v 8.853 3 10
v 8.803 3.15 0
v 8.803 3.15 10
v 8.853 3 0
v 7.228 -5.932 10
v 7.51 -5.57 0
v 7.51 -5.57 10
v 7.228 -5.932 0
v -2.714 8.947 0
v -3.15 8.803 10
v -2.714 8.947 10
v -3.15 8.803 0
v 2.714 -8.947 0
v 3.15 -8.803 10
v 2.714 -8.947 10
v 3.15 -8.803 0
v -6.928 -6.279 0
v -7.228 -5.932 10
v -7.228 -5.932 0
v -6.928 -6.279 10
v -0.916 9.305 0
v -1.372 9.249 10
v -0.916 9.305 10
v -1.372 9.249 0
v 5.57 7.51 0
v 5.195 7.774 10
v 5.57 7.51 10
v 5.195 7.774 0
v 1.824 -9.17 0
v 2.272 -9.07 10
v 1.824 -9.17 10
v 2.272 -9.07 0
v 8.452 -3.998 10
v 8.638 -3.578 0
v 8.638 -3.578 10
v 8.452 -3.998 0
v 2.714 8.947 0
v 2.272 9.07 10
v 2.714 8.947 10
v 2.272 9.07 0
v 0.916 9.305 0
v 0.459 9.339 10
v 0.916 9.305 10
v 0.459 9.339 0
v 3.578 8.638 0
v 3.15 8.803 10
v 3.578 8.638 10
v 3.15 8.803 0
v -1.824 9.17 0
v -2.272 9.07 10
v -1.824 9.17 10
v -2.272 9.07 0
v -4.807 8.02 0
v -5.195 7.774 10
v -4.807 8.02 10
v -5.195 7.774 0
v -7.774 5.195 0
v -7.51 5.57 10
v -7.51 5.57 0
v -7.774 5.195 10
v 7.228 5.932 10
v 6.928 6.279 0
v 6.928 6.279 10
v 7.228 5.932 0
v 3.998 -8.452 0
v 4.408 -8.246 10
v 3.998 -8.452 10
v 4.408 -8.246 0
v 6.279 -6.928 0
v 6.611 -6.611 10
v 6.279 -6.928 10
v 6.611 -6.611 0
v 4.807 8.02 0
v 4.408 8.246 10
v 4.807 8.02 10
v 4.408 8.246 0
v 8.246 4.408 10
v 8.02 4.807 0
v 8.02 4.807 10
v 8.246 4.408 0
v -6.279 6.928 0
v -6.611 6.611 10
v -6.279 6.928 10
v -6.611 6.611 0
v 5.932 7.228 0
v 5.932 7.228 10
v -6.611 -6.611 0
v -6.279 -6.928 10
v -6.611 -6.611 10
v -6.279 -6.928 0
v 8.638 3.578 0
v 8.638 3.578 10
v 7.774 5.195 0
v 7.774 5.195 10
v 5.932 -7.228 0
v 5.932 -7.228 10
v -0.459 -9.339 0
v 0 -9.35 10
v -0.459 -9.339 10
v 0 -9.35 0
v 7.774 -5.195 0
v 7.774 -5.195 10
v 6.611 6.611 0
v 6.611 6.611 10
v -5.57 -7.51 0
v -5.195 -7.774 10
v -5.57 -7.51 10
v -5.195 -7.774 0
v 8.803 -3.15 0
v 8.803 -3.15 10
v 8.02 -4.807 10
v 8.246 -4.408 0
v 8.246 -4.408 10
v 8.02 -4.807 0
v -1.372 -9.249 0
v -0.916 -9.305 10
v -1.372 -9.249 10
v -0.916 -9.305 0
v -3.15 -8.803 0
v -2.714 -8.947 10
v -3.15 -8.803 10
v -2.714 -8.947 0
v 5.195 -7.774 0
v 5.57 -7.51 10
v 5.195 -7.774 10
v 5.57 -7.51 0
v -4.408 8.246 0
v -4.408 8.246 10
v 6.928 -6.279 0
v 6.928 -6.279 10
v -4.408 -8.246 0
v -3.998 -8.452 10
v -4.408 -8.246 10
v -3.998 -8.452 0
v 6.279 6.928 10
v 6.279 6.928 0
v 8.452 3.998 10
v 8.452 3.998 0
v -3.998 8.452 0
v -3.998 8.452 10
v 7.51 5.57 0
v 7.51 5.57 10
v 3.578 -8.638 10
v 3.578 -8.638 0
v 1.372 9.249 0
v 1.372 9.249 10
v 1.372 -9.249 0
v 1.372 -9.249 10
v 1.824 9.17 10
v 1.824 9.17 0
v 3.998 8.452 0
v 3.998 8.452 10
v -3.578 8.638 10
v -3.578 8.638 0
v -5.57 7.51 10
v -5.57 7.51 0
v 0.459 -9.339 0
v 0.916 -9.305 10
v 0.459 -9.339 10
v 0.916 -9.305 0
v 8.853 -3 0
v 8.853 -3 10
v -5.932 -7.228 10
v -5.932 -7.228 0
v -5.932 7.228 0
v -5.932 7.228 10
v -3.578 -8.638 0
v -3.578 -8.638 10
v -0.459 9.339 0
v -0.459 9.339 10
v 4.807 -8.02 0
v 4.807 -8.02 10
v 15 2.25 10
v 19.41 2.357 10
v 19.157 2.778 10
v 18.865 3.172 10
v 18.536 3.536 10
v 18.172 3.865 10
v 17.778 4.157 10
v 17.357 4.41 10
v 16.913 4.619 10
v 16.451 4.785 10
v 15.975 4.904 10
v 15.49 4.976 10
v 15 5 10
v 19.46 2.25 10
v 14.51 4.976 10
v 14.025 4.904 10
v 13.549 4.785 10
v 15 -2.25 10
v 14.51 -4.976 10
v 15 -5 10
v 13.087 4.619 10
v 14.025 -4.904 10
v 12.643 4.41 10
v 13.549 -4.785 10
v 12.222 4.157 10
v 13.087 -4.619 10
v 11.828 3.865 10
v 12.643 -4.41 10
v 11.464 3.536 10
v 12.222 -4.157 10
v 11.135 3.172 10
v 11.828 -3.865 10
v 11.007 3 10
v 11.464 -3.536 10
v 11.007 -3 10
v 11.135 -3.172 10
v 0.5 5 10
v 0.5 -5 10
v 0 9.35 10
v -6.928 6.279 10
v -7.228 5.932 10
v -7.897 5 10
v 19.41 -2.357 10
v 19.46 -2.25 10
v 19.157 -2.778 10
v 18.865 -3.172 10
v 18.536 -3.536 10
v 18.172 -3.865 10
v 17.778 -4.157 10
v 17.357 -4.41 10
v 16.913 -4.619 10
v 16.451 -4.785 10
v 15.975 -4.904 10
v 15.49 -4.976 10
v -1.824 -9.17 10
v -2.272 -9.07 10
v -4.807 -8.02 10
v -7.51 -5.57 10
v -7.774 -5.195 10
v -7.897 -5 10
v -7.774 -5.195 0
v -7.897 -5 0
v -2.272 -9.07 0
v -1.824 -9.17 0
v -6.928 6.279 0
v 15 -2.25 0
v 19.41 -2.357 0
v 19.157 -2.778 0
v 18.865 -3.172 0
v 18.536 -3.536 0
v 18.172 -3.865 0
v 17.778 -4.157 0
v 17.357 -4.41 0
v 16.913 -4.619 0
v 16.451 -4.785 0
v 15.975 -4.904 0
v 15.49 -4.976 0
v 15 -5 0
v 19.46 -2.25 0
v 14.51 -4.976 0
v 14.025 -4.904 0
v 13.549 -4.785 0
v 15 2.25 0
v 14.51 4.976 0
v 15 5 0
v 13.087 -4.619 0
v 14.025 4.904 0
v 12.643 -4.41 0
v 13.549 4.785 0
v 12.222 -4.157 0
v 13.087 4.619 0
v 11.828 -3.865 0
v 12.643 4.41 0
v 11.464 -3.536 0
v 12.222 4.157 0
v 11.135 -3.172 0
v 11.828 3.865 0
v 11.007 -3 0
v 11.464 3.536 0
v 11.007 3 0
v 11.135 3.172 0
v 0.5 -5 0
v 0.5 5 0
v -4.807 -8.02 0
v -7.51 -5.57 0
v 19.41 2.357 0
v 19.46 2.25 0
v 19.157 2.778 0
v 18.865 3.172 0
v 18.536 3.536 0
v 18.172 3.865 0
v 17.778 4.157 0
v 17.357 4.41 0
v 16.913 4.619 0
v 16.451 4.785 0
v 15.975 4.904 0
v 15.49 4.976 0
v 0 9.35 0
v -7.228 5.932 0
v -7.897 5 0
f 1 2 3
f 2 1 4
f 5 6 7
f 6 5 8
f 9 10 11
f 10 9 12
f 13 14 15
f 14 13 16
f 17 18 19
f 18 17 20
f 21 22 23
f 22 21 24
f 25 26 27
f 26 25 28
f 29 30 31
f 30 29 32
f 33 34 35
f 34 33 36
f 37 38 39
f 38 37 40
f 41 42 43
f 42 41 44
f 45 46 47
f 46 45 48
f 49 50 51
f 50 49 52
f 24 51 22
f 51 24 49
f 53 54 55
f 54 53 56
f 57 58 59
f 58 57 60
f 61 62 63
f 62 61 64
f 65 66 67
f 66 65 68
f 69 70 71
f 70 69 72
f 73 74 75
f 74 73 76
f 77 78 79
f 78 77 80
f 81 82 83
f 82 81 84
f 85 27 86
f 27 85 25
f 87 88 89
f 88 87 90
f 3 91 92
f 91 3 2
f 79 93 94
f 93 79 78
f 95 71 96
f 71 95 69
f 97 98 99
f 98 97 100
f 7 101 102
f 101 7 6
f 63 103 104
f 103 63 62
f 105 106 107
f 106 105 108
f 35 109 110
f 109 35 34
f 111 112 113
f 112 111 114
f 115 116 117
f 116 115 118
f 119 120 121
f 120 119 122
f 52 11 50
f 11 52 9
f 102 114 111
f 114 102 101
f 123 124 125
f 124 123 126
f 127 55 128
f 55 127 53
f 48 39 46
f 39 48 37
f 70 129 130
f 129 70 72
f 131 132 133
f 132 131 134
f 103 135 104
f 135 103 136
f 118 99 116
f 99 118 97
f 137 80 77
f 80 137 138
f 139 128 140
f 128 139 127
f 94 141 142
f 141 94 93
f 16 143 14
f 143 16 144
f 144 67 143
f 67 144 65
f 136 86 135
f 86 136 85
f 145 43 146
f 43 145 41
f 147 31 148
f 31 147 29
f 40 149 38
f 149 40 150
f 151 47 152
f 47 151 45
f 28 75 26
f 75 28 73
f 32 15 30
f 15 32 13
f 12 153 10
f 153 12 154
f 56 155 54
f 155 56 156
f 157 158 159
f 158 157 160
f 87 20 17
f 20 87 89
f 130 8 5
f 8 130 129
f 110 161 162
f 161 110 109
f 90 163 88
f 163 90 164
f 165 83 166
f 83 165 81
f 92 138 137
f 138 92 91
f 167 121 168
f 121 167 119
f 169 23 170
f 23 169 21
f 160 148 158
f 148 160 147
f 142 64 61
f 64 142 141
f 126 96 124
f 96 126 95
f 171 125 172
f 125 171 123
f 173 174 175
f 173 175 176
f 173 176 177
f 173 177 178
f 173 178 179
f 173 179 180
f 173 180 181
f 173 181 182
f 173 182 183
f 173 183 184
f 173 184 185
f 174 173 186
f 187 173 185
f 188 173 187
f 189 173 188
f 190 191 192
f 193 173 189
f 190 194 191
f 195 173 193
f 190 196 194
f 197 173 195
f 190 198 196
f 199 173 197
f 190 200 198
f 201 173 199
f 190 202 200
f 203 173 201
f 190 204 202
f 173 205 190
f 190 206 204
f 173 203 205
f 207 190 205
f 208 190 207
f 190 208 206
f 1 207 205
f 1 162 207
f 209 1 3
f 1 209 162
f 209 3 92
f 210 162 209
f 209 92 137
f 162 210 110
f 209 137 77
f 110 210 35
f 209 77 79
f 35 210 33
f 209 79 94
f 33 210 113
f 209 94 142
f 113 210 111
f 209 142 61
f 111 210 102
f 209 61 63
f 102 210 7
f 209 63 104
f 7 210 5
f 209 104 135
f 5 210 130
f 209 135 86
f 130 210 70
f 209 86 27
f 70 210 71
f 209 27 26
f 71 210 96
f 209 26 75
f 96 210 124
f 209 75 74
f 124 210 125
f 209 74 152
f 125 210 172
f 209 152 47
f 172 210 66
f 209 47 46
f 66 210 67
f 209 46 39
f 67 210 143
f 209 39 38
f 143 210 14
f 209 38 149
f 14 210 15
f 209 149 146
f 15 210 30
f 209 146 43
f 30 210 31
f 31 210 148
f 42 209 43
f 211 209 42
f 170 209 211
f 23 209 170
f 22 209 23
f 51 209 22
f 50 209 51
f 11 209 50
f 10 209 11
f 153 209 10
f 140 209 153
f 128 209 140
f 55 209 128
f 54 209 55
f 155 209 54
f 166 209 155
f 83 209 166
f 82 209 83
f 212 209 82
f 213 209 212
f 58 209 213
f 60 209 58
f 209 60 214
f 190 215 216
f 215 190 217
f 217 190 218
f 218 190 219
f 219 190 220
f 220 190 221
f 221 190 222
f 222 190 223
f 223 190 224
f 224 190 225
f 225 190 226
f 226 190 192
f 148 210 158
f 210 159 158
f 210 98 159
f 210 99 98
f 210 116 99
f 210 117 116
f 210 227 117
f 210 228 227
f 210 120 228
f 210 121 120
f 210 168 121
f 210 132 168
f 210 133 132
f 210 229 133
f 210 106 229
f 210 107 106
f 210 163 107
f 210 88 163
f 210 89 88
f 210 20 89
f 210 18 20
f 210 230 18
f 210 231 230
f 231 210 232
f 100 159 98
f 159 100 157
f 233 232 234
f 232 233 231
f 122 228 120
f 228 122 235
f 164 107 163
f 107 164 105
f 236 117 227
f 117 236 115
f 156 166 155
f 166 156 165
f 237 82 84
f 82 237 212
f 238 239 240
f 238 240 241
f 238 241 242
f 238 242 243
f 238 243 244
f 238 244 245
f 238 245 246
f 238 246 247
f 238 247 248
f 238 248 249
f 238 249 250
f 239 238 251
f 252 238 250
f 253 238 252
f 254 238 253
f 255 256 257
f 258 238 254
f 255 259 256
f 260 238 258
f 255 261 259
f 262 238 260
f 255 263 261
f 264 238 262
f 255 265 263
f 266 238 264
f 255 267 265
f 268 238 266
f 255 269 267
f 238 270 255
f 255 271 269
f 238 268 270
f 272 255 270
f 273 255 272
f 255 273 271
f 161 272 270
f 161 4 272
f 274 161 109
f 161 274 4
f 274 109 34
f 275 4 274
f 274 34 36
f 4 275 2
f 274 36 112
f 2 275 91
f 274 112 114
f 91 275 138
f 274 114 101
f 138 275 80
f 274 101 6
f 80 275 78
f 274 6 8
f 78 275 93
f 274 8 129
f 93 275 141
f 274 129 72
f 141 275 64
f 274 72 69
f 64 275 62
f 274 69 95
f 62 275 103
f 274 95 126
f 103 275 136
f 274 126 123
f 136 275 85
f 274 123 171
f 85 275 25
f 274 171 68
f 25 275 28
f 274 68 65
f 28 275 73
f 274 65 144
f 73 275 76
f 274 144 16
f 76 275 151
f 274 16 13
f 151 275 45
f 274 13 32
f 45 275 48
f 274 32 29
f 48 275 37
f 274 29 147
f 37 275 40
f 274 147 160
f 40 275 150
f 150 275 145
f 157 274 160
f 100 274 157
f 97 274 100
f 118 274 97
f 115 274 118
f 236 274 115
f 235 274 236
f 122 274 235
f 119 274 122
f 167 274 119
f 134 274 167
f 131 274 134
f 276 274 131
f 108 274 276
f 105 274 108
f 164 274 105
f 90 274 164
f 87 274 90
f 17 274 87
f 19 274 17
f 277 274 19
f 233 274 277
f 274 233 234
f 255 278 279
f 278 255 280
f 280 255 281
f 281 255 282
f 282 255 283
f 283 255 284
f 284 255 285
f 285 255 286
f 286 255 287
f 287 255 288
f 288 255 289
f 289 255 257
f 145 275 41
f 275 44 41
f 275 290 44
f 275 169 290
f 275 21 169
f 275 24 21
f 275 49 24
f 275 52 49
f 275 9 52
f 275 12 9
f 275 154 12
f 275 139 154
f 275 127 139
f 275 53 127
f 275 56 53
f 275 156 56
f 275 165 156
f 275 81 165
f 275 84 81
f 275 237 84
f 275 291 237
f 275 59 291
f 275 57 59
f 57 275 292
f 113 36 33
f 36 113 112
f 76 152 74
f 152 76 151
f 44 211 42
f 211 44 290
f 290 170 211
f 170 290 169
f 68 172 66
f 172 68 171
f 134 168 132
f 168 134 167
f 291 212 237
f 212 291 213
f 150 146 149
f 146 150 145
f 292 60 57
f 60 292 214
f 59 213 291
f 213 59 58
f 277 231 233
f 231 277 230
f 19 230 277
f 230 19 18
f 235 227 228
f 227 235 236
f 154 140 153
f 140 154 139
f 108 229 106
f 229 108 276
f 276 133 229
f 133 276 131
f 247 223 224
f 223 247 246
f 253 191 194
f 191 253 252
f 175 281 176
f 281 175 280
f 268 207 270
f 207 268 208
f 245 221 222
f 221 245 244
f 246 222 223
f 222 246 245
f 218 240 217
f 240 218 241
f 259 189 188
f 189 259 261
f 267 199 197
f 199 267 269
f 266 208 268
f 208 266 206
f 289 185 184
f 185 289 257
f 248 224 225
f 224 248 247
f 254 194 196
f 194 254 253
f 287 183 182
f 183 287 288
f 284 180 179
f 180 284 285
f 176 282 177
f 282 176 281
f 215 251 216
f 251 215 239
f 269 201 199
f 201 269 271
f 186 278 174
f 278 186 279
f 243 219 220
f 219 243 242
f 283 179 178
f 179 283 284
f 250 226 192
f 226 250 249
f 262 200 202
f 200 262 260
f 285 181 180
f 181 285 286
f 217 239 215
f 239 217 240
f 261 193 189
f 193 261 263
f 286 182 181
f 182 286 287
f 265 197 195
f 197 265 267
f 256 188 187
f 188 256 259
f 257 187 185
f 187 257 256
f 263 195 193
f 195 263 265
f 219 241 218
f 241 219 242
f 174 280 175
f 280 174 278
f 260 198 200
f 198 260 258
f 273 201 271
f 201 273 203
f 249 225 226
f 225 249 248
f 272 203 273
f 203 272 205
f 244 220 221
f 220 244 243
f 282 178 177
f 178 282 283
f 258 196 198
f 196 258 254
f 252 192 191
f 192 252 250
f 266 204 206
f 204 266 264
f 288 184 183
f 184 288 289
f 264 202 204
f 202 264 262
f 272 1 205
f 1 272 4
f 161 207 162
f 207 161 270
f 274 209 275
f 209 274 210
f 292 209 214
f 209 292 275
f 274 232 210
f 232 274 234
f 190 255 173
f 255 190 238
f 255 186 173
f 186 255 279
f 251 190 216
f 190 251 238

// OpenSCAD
// Tubing clip for 12.7 mm lab stand rod
// Print orientation: flat on bed, extruded up +Z

$fn = 96;

// ---- Ring 1: rod ring ----
ring1_id   = 12.7;   // inner diameter (rod clearance)
ring1_wall = 3;      // wall thickness
ring1_od   = ring1_id + 2 * ring1_wall; // outer diameter = 18.7
ring1_x    = 0;      // centre X
ring1_y    = 0;      // centre Y

// ---- Ring 2: tubing ring ----
ring2_id   = 6;      // inner diameter
ring2_wall = 2;      // wall thickness
ring2_od   = ring2_id + 2 * ring2_wall; // outer diameter = 10
ring2_x    = 15;     // centre X
ring2_y    = 0;      // centre Y

// ---- Bridge ----
bridge_x0  = 8;      // start X
bridge_x1  = 12;     // end X
bridge_w   = 6;      // width in Y

// ---- Cutouts ----
cut1_w     = 10;     // rod ring opening width (-X side)
cut2_w     = 4.5;    // tubing ring opening width (+X side)
eps        = 0.5;    // cutter overshoot

// ---- Model ----
h = 10;              // extrusion height
difference() {
    union() {
        // Rod ring
        cylinder(h = h, d = ring1_od, $fn = 128);
        // Tubing ring
        translate([ring2_x, ring2_y, 0])
            cylinder(h = h, d = ring2_od, $fn = 64);
        // Bridge
        translate([bridge_x0, -bridge_w / 2, 0])
            cube([bridge_x1 - bridge_x0, bridge_w, h]);
    }
    // Rod ring opening: x < 0, -5 < y < 5
    translate([-ring1_od - eps, -cut1_w / 2, -eps])
        cube([ring1_od + 2 * eps, cut1_w, h + 2 * eps]);
    // Tubing ring opening: x > 15, -2.25 < y < 2.25
    translate([ring2_x, -cut2_w / 2, -eps])
        cube([ring2_od + 2 * eps, cut2_w, h + 2 * eps]);
}
